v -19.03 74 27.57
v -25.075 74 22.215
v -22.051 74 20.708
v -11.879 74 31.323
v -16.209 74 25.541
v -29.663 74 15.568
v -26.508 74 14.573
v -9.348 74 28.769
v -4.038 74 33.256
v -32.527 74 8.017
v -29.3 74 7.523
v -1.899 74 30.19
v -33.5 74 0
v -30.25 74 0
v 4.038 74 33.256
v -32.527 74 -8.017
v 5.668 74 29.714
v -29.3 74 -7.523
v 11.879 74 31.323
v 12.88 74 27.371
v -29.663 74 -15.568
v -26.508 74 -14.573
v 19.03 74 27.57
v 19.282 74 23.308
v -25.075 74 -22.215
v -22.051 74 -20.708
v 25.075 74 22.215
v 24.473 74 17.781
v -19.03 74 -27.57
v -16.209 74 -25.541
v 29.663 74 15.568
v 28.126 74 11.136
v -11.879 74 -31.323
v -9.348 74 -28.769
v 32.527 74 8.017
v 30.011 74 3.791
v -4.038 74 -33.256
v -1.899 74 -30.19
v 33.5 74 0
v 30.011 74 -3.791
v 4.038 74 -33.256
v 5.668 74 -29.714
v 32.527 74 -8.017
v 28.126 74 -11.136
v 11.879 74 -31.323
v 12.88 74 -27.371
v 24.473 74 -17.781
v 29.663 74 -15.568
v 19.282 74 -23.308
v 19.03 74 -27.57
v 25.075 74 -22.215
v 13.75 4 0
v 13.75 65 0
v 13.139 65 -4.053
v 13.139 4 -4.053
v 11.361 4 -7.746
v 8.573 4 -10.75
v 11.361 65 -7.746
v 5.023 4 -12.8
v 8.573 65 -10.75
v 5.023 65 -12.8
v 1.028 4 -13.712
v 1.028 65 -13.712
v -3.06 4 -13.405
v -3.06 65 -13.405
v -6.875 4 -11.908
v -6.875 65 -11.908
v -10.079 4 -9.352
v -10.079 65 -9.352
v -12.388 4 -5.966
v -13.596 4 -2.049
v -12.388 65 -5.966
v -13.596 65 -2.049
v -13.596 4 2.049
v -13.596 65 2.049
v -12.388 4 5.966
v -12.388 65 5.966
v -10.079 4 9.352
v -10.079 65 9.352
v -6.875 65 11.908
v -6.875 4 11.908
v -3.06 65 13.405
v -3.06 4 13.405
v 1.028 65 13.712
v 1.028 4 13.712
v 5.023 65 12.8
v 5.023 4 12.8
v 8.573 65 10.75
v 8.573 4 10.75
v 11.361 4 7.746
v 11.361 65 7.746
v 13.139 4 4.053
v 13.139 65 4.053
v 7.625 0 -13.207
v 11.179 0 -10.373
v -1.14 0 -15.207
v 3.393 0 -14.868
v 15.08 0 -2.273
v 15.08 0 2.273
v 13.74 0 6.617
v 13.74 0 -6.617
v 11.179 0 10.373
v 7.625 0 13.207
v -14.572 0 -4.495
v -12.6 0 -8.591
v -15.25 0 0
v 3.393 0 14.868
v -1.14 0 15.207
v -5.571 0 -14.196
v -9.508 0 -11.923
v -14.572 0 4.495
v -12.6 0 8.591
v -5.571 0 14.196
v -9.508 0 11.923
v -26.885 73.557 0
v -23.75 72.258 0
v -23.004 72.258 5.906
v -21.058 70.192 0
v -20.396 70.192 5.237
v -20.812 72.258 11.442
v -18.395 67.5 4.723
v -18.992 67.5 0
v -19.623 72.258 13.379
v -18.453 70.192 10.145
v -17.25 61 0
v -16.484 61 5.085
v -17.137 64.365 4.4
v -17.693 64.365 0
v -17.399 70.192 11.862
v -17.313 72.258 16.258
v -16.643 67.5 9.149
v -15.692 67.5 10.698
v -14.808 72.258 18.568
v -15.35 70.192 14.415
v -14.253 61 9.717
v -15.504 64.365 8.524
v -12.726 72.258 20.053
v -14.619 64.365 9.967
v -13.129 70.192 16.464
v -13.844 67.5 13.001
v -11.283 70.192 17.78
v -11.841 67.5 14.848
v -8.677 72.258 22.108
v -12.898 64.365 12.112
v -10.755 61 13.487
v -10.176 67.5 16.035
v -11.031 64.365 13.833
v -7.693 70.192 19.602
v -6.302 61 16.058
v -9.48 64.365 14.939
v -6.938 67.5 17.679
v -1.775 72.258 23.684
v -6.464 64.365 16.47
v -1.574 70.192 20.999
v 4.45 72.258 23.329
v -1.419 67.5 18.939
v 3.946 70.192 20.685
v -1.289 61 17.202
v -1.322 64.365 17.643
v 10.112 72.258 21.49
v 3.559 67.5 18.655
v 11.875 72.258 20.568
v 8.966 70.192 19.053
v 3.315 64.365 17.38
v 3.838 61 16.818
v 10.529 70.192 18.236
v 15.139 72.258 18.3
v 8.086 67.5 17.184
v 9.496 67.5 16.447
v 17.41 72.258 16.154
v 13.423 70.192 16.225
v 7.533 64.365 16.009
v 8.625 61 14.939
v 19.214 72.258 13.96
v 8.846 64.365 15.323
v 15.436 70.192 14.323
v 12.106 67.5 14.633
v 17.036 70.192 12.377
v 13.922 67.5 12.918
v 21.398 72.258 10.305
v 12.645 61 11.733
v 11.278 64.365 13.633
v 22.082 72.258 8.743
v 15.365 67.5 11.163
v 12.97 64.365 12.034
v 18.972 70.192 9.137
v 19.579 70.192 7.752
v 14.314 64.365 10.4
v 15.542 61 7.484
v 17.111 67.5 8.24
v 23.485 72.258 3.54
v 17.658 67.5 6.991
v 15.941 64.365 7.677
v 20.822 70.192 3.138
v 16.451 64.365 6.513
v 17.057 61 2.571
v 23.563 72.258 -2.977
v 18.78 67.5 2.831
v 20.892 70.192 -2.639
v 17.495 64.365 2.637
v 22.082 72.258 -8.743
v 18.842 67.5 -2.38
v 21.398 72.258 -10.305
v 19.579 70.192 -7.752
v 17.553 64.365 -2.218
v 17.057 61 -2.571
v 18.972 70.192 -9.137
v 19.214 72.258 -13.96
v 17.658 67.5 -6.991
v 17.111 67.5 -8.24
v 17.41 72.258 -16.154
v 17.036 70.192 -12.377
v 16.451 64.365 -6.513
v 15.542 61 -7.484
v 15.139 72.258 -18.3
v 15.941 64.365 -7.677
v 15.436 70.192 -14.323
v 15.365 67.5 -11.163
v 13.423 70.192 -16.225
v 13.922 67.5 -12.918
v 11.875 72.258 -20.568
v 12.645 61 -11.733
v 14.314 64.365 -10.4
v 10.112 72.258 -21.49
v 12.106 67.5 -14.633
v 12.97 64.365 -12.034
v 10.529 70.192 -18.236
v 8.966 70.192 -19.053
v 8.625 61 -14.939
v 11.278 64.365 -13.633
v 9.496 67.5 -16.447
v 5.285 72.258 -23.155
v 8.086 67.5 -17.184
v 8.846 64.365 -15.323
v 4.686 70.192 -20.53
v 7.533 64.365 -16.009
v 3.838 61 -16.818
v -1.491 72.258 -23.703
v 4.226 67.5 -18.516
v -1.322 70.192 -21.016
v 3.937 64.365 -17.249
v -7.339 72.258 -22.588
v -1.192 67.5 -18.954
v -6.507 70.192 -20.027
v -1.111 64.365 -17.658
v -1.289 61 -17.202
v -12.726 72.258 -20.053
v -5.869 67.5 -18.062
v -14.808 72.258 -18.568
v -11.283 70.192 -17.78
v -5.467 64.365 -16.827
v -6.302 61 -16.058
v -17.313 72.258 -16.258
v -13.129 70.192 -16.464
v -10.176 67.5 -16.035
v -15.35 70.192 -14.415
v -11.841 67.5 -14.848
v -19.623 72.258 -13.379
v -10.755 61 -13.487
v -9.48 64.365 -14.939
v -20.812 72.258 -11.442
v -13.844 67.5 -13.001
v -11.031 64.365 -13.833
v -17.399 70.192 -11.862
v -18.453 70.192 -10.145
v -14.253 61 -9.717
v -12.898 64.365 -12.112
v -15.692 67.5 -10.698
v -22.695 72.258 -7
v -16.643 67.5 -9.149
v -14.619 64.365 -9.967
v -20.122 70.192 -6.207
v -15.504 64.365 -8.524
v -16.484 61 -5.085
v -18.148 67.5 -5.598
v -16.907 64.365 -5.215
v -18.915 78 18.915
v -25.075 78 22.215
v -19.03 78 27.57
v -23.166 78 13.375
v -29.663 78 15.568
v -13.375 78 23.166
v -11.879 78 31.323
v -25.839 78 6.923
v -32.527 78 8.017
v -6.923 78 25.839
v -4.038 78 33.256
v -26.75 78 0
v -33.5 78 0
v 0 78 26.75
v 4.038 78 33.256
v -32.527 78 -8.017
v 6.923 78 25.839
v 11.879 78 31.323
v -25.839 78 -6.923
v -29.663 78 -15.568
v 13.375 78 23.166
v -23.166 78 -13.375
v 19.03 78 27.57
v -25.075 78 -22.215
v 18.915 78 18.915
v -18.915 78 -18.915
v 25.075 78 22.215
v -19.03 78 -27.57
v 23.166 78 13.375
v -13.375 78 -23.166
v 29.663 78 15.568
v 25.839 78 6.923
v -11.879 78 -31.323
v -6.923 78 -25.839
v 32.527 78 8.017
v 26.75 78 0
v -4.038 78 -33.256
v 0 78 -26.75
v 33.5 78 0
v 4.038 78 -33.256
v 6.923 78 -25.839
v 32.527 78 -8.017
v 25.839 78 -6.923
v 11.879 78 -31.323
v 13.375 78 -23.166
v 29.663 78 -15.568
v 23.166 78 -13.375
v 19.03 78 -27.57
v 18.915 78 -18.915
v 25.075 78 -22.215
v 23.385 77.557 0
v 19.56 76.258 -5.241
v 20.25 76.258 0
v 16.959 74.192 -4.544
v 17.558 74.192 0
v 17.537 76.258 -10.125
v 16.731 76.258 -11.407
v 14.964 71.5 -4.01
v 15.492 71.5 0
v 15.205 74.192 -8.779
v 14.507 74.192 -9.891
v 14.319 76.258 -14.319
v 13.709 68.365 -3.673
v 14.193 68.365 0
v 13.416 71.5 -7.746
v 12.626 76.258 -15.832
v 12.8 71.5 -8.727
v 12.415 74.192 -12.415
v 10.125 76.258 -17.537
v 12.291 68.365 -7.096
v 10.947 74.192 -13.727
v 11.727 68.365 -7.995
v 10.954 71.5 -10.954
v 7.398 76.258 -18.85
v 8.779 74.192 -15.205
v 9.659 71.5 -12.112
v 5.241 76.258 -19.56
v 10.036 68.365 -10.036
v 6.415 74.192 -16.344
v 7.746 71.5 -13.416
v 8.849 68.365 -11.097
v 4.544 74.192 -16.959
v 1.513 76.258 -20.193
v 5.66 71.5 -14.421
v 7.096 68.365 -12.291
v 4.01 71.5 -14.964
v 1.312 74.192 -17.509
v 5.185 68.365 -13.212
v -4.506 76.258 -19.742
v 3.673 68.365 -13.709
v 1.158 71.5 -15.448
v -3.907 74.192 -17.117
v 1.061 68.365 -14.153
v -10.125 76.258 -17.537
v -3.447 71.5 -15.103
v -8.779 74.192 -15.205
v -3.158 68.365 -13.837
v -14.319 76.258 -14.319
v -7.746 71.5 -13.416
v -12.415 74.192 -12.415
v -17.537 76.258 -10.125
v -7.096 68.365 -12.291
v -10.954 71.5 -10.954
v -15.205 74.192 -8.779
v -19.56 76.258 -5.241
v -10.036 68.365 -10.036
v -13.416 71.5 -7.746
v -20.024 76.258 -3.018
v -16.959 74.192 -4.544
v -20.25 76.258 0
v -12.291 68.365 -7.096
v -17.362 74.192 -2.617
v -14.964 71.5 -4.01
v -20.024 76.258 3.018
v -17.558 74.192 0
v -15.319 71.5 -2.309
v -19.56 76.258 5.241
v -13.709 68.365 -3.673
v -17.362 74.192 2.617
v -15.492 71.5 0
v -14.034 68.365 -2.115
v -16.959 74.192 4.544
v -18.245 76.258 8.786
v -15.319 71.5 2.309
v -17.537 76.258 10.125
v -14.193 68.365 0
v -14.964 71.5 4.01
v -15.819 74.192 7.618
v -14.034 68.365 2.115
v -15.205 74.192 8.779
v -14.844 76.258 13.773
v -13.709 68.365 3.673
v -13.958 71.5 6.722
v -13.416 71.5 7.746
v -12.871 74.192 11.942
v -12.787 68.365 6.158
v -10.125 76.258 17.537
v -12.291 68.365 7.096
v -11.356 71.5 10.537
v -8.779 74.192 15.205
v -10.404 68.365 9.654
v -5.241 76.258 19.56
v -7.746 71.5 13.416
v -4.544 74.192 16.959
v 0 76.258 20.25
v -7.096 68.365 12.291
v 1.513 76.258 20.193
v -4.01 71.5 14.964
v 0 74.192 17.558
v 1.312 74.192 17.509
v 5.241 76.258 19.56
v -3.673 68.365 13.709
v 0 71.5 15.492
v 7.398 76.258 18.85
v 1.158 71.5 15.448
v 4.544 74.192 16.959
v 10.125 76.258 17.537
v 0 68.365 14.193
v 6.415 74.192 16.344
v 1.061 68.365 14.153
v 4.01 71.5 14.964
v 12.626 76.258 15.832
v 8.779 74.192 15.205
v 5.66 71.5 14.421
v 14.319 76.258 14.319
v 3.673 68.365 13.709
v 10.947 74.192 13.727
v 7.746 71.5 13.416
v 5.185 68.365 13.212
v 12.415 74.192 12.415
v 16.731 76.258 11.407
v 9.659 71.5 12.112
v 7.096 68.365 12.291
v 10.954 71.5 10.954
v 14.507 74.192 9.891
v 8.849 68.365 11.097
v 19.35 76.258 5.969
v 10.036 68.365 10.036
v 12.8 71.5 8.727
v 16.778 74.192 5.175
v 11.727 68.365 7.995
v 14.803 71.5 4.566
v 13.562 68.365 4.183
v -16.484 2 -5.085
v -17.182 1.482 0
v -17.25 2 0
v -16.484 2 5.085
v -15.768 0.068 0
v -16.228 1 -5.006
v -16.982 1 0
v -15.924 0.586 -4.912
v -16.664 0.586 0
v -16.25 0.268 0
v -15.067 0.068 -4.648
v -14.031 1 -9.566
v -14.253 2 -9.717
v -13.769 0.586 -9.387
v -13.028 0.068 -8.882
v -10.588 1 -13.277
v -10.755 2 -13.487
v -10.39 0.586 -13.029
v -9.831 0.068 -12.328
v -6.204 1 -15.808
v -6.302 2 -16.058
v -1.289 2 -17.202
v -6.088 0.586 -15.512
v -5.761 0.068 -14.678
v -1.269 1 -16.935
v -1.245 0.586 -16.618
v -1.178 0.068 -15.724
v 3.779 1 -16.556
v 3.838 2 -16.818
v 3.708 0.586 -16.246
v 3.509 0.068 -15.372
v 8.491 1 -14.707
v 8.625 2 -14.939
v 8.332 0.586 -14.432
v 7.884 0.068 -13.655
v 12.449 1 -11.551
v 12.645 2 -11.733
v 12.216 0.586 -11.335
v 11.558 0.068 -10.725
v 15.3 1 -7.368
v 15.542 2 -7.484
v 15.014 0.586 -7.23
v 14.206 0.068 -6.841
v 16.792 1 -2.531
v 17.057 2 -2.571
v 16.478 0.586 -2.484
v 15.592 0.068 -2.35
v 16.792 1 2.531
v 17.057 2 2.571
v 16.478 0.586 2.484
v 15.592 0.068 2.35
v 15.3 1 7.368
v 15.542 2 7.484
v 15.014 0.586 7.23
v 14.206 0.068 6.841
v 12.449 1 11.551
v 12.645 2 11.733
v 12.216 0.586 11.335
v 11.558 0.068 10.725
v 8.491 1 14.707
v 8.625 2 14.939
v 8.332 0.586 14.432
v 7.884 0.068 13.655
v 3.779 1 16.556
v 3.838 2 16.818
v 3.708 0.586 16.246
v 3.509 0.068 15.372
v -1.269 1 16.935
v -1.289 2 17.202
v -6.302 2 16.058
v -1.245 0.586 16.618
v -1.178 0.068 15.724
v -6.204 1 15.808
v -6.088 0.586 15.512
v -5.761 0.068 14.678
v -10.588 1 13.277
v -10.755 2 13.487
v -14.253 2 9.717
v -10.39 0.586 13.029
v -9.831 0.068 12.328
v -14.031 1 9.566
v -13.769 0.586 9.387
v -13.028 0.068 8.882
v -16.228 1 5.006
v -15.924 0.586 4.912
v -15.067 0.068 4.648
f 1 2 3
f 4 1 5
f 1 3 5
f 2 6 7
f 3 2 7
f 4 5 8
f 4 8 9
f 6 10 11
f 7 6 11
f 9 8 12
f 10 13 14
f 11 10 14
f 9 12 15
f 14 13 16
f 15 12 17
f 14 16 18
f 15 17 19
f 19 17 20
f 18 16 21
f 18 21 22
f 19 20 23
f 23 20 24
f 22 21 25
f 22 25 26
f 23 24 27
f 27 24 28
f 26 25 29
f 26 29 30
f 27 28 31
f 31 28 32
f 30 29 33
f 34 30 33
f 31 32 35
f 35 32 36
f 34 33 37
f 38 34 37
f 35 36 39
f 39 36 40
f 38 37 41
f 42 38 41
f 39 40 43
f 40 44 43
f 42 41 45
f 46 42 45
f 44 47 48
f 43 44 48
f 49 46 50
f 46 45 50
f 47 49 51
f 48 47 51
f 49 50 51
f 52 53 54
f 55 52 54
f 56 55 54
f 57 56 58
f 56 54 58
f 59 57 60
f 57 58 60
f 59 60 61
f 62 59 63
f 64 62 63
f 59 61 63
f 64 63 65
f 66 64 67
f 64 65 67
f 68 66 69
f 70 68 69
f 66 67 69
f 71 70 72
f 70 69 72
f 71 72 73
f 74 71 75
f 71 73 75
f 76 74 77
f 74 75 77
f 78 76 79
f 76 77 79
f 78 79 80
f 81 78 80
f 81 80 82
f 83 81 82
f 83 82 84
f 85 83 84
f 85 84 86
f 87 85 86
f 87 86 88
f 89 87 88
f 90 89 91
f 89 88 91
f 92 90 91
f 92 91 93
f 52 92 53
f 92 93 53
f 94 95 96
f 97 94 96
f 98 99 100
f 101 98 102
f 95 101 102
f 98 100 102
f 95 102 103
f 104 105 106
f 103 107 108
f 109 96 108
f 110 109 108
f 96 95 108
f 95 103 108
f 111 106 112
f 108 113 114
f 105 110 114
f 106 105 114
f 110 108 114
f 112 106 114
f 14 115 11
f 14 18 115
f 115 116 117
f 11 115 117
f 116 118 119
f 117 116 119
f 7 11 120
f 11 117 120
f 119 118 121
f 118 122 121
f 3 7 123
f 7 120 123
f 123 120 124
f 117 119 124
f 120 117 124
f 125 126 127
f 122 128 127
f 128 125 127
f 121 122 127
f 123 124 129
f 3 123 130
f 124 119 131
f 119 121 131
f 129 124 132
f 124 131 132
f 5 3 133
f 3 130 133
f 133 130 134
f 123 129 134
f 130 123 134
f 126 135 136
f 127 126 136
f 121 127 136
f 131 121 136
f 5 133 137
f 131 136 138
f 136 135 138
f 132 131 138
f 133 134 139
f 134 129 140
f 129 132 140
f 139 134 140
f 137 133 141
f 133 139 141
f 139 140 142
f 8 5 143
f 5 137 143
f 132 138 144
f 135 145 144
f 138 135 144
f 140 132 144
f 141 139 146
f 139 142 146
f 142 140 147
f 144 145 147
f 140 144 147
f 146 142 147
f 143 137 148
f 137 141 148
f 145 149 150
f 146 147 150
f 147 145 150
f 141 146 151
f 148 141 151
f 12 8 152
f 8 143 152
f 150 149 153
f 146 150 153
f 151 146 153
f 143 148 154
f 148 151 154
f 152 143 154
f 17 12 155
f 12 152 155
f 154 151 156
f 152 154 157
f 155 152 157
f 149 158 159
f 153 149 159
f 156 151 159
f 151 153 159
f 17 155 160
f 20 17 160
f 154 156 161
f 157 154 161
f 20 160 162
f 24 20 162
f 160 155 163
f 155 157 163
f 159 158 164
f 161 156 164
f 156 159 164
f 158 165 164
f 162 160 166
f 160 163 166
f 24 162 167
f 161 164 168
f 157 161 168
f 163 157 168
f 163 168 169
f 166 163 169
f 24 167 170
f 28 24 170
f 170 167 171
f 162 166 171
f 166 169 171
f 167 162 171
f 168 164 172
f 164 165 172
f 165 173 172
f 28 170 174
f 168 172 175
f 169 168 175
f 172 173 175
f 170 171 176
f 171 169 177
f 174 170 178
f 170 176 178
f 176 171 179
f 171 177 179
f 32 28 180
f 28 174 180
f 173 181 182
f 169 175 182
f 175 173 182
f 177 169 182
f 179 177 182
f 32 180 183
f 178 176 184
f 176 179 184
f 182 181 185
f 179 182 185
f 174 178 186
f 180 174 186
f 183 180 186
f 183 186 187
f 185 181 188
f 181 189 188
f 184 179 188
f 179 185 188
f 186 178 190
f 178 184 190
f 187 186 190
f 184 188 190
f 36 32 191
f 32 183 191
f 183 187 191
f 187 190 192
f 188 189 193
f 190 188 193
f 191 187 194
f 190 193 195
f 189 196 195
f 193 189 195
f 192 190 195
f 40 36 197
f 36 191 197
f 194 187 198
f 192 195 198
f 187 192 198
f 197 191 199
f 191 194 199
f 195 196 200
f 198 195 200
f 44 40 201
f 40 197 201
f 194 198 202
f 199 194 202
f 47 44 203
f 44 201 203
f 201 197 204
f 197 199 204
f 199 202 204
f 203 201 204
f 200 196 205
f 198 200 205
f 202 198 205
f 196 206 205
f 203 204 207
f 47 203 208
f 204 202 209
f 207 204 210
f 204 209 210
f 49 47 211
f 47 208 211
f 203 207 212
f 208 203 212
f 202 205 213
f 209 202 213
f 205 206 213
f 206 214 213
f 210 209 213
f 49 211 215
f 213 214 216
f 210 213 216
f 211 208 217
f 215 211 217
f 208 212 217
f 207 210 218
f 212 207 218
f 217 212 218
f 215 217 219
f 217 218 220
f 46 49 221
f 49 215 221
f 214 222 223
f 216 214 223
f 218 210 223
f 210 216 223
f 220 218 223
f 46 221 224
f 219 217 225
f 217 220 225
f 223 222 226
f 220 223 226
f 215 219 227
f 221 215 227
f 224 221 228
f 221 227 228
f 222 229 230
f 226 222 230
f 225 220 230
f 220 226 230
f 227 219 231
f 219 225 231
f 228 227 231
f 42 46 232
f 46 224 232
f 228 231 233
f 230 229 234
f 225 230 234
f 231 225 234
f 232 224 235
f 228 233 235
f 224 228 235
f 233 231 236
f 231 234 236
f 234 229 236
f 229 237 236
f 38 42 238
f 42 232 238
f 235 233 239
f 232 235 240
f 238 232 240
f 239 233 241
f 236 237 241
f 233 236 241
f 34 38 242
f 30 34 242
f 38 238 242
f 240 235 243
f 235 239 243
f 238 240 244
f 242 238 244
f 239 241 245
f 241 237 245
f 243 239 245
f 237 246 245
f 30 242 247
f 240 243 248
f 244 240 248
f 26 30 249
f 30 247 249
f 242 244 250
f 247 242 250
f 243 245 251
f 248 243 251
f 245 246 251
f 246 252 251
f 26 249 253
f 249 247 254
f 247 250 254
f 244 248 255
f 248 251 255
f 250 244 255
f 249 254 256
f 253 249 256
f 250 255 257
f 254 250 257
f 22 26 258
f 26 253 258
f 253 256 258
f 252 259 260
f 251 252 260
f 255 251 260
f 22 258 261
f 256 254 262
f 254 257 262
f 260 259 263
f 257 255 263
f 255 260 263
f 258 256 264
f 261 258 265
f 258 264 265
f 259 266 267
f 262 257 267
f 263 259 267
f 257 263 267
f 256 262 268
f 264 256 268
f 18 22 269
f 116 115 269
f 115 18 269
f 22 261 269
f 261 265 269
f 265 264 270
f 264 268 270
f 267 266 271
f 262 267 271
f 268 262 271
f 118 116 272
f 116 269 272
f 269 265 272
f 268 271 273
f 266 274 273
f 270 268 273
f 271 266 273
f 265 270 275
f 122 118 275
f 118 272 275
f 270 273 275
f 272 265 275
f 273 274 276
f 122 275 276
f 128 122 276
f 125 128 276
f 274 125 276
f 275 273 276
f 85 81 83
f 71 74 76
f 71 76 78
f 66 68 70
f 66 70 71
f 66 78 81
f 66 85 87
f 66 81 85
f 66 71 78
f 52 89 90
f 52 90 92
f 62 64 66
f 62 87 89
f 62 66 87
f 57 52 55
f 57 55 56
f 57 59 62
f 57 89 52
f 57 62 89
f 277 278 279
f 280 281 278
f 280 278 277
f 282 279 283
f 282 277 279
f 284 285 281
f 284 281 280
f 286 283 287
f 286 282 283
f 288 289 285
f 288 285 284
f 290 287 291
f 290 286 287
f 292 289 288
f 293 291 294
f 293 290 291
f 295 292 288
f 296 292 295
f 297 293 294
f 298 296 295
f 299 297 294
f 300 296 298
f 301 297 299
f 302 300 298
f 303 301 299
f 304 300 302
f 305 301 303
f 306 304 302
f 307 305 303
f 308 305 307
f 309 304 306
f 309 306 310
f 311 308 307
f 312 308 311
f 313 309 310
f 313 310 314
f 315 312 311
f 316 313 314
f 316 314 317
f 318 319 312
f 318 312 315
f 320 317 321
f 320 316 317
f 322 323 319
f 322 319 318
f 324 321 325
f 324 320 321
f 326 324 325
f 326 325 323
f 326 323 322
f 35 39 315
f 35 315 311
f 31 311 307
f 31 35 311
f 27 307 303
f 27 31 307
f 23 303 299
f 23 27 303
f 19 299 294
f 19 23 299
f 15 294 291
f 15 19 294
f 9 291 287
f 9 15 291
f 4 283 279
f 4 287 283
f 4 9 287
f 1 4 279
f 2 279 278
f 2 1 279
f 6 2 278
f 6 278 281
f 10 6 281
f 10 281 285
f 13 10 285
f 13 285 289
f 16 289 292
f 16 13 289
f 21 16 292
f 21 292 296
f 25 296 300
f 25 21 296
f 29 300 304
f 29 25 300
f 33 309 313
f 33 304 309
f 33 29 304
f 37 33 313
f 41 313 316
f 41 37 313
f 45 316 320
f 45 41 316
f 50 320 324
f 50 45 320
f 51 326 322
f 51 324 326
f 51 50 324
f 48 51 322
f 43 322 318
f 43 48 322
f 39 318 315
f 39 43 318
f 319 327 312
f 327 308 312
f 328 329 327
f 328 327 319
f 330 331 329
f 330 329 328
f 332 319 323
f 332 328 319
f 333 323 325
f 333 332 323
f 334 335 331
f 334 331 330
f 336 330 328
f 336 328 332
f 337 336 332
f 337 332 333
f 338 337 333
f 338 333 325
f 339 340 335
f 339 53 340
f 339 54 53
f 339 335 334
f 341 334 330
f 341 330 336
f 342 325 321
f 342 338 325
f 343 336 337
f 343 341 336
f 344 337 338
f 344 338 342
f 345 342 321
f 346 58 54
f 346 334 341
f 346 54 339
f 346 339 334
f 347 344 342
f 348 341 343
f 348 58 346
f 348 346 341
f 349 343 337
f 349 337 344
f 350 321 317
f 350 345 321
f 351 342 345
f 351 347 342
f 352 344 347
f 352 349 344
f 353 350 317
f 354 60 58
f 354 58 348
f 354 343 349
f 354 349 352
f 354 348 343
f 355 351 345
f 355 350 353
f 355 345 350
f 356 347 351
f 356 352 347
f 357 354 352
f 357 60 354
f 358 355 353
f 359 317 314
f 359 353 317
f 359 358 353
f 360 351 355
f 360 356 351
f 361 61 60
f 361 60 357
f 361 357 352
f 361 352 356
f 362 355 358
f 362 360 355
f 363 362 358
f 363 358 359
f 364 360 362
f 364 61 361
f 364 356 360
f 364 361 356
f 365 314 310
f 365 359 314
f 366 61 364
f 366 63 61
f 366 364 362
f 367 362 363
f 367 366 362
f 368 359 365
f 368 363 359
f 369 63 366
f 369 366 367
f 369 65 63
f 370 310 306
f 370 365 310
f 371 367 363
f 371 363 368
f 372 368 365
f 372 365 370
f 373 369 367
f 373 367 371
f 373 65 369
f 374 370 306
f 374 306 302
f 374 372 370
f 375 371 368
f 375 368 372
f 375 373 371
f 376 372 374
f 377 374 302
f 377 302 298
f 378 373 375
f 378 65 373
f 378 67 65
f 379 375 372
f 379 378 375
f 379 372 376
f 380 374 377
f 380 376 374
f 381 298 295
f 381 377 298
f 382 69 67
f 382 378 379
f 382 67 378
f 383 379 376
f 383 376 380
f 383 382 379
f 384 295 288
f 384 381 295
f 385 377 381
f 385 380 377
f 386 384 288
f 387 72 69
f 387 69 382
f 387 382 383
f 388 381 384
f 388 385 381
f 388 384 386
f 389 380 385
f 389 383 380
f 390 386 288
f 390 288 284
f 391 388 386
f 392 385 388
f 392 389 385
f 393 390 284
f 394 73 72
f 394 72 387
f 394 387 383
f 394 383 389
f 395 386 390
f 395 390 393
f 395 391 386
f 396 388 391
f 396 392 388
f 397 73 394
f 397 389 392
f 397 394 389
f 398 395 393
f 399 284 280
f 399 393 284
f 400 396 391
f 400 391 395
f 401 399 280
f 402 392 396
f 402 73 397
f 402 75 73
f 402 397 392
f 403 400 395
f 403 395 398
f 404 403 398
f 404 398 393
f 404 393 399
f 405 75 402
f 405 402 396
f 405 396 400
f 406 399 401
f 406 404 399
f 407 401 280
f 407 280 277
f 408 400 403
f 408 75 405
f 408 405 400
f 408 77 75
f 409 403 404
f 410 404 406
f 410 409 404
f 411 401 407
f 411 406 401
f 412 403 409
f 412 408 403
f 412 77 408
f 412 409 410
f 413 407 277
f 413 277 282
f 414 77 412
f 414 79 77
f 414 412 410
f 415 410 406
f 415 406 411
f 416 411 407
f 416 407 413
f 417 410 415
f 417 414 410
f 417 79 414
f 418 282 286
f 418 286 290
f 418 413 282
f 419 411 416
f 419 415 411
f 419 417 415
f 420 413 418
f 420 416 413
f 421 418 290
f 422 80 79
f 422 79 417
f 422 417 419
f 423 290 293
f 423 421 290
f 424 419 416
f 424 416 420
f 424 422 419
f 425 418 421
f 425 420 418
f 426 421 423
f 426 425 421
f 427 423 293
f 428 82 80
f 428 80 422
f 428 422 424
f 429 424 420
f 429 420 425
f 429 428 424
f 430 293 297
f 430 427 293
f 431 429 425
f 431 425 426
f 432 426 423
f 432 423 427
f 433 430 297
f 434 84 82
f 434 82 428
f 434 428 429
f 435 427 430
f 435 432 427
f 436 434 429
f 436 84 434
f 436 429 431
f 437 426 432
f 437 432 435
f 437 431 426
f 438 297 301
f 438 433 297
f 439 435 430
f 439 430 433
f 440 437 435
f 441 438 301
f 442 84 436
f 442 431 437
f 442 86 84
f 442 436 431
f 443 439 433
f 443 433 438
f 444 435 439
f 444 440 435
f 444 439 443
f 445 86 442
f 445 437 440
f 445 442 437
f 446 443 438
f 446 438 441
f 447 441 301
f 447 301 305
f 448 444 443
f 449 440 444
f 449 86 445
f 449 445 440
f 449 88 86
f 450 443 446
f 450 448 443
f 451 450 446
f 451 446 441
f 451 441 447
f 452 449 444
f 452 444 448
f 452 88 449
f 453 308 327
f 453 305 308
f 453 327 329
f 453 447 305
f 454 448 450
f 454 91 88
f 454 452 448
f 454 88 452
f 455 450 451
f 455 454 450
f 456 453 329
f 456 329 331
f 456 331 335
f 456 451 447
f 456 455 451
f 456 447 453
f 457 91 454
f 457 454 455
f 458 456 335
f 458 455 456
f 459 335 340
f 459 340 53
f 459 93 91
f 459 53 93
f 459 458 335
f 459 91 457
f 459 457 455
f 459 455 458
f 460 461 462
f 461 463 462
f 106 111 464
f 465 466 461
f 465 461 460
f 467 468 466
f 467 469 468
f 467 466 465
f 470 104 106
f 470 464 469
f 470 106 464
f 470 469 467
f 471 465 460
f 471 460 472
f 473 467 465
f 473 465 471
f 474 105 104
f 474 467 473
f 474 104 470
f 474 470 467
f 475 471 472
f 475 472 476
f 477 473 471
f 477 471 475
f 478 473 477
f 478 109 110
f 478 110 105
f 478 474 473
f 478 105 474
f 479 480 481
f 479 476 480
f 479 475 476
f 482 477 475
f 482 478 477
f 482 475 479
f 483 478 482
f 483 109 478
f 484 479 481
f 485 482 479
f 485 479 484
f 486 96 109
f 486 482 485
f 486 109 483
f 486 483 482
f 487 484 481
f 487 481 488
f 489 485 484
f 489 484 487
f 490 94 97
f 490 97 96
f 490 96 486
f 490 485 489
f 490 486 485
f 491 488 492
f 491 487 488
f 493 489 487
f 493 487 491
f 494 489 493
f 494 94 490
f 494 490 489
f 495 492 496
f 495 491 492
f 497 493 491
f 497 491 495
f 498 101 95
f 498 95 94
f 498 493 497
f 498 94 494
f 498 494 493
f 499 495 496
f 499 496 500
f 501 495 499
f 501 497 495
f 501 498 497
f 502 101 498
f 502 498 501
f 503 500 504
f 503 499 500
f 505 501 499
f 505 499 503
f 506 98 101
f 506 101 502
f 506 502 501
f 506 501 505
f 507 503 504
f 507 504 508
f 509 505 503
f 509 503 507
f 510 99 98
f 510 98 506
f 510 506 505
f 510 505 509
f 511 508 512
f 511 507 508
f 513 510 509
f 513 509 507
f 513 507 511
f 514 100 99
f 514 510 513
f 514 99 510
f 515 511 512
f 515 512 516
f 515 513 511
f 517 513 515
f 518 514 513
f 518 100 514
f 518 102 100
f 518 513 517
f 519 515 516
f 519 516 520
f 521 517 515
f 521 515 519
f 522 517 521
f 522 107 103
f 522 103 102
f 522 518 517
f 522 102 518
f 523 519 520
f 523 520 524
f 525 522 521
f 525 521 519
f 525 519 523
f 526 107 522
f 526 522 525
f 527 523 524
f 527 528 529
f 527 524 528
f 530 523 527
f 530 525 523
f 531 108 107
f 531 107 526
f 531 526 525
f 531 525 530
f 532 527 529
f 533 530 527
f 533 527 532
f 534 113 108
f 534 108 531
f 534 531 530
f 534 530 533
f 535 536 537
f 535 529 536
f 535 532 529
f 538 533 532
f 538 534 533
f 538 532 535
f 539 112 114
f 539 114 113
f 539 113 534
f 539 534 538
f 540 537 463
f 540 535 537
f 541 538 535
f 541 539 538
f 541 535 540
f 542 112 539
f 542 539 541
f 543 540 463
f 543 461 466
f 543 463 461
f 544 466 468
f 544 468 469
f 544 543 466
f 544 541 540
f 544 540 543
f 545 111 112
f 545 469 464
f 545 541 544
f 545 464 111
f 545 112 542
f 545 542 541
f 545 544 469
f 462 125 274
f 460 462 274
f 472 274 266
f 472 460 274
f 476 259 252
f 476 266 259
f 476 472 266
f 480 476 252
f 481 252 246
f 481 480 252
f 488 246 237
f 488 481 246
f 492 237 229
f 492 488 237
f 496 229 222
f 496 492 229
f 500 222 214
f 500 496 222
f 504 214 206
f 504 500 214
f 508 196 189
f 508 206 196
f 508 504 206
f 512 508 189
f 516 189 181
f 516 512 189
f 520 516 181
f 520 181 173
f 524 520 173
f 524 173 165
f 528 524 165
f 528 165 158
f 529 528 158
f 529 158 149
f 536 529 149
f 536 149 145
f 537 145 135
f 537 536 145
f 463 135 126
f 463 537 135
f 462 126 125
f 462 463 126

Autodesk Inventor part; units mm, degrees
ref_plane "YZ Plane" through (0, 0, 0) normal (1, 0, 0) x (0, 1, 0)
ref_plane "XZ Plane" through (0, 0, 0) normal (0, 1, 0) x (-1, 0, 0)
ref_plane "XY Plane" through (0, 0, 0) normal (0, 0, 1) x (1, 0, 0)
sketch "Sketch1" plane through (0, 0, 0) normal (0, 1, 0) x (-1, 0, 0)
  circle A0 centre (0, 0) radius 17.25
  dimension "d0" = 34.5
extrude "Extrusion1" add sketch "Sketch1" along normal blind 74
sketch "Sketch2" plane through (0, 74, 0) normal (0, 1, 0) x (1, 0, 0)
  circle A0 centre (0, 0) radius 33.5
  dimension "d3" = 67
extrude "Extrusion2" add sketch "Sketch2" along normal blind 4
fillet "Fillet1" radius 13 1 edges at (17.25, 74, 0)
sketch "Sketch3" plane through (0, 78, 0) normal (0, 1, 0) x (1, 0, 0)
  circle A0 centre (0, 0) radius 13.75
  dimension "d8" = 27.5
extrude "Extrusion3" cut sketch "Sketch3" against normal blind 74
fillet "Fillet2" radius 13 1 edges at (-13.75, 78, 0)
fillet "Fillet3" radius 2 1 edges at (17.25, 0, 0)
properties part number "Juice_Extractor_Pusher"
